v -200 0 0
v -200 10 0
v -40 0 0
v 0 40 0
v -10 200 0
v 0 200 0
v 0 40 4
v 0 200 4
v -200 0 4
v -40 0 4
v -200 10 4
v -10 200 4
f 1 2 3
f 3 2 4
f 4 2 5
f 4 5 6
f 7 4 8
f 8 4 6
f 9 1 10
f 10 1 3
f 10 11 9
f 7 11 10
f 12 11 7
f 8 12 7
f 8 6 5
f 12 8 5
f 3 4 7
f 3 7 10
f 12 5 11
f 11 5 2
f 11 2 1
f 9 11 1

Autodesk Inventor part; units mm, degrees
ref_plane "YZ Plane" through (0, 0, 0) normal (1, 0, 0) x (0, 1, 0)
ref_plane "XZ Plane" through (0, 0, 0) normal (0, 1, 0) x (-1, 0, 0)
ref_plane "XY Plane" through (0, 0, 0) normal (0, 0, 1) x (1, 0, 0)
sketch "Sketch1" plane through (0, 0, 0) normal (0, 0, 1) x (1, 0, 0)
  line L0 (0, 0) -> (0, 200)
  line L1 (0, 200) -> (-10, 200)
  line L2 (-10, 200) -> (-200, 10)
  line L3 (-200, 10) -> (-200, 0)
  line L4 (-200, 0) -> (0, 0)
  line L5 (0, 40) -> (-40, 0)
  dimension "d162" = 200
  dimension "d163" = 10
  dimension "d164" = 40
  dimension "d165" = 40
extrude "Plate5" add sketch "Sketch1" along normal blind 4 contours L5 L4 L3 L2 L1 L0
properties part number "PNS-077 stretch plate" material "Stainless Steel"
